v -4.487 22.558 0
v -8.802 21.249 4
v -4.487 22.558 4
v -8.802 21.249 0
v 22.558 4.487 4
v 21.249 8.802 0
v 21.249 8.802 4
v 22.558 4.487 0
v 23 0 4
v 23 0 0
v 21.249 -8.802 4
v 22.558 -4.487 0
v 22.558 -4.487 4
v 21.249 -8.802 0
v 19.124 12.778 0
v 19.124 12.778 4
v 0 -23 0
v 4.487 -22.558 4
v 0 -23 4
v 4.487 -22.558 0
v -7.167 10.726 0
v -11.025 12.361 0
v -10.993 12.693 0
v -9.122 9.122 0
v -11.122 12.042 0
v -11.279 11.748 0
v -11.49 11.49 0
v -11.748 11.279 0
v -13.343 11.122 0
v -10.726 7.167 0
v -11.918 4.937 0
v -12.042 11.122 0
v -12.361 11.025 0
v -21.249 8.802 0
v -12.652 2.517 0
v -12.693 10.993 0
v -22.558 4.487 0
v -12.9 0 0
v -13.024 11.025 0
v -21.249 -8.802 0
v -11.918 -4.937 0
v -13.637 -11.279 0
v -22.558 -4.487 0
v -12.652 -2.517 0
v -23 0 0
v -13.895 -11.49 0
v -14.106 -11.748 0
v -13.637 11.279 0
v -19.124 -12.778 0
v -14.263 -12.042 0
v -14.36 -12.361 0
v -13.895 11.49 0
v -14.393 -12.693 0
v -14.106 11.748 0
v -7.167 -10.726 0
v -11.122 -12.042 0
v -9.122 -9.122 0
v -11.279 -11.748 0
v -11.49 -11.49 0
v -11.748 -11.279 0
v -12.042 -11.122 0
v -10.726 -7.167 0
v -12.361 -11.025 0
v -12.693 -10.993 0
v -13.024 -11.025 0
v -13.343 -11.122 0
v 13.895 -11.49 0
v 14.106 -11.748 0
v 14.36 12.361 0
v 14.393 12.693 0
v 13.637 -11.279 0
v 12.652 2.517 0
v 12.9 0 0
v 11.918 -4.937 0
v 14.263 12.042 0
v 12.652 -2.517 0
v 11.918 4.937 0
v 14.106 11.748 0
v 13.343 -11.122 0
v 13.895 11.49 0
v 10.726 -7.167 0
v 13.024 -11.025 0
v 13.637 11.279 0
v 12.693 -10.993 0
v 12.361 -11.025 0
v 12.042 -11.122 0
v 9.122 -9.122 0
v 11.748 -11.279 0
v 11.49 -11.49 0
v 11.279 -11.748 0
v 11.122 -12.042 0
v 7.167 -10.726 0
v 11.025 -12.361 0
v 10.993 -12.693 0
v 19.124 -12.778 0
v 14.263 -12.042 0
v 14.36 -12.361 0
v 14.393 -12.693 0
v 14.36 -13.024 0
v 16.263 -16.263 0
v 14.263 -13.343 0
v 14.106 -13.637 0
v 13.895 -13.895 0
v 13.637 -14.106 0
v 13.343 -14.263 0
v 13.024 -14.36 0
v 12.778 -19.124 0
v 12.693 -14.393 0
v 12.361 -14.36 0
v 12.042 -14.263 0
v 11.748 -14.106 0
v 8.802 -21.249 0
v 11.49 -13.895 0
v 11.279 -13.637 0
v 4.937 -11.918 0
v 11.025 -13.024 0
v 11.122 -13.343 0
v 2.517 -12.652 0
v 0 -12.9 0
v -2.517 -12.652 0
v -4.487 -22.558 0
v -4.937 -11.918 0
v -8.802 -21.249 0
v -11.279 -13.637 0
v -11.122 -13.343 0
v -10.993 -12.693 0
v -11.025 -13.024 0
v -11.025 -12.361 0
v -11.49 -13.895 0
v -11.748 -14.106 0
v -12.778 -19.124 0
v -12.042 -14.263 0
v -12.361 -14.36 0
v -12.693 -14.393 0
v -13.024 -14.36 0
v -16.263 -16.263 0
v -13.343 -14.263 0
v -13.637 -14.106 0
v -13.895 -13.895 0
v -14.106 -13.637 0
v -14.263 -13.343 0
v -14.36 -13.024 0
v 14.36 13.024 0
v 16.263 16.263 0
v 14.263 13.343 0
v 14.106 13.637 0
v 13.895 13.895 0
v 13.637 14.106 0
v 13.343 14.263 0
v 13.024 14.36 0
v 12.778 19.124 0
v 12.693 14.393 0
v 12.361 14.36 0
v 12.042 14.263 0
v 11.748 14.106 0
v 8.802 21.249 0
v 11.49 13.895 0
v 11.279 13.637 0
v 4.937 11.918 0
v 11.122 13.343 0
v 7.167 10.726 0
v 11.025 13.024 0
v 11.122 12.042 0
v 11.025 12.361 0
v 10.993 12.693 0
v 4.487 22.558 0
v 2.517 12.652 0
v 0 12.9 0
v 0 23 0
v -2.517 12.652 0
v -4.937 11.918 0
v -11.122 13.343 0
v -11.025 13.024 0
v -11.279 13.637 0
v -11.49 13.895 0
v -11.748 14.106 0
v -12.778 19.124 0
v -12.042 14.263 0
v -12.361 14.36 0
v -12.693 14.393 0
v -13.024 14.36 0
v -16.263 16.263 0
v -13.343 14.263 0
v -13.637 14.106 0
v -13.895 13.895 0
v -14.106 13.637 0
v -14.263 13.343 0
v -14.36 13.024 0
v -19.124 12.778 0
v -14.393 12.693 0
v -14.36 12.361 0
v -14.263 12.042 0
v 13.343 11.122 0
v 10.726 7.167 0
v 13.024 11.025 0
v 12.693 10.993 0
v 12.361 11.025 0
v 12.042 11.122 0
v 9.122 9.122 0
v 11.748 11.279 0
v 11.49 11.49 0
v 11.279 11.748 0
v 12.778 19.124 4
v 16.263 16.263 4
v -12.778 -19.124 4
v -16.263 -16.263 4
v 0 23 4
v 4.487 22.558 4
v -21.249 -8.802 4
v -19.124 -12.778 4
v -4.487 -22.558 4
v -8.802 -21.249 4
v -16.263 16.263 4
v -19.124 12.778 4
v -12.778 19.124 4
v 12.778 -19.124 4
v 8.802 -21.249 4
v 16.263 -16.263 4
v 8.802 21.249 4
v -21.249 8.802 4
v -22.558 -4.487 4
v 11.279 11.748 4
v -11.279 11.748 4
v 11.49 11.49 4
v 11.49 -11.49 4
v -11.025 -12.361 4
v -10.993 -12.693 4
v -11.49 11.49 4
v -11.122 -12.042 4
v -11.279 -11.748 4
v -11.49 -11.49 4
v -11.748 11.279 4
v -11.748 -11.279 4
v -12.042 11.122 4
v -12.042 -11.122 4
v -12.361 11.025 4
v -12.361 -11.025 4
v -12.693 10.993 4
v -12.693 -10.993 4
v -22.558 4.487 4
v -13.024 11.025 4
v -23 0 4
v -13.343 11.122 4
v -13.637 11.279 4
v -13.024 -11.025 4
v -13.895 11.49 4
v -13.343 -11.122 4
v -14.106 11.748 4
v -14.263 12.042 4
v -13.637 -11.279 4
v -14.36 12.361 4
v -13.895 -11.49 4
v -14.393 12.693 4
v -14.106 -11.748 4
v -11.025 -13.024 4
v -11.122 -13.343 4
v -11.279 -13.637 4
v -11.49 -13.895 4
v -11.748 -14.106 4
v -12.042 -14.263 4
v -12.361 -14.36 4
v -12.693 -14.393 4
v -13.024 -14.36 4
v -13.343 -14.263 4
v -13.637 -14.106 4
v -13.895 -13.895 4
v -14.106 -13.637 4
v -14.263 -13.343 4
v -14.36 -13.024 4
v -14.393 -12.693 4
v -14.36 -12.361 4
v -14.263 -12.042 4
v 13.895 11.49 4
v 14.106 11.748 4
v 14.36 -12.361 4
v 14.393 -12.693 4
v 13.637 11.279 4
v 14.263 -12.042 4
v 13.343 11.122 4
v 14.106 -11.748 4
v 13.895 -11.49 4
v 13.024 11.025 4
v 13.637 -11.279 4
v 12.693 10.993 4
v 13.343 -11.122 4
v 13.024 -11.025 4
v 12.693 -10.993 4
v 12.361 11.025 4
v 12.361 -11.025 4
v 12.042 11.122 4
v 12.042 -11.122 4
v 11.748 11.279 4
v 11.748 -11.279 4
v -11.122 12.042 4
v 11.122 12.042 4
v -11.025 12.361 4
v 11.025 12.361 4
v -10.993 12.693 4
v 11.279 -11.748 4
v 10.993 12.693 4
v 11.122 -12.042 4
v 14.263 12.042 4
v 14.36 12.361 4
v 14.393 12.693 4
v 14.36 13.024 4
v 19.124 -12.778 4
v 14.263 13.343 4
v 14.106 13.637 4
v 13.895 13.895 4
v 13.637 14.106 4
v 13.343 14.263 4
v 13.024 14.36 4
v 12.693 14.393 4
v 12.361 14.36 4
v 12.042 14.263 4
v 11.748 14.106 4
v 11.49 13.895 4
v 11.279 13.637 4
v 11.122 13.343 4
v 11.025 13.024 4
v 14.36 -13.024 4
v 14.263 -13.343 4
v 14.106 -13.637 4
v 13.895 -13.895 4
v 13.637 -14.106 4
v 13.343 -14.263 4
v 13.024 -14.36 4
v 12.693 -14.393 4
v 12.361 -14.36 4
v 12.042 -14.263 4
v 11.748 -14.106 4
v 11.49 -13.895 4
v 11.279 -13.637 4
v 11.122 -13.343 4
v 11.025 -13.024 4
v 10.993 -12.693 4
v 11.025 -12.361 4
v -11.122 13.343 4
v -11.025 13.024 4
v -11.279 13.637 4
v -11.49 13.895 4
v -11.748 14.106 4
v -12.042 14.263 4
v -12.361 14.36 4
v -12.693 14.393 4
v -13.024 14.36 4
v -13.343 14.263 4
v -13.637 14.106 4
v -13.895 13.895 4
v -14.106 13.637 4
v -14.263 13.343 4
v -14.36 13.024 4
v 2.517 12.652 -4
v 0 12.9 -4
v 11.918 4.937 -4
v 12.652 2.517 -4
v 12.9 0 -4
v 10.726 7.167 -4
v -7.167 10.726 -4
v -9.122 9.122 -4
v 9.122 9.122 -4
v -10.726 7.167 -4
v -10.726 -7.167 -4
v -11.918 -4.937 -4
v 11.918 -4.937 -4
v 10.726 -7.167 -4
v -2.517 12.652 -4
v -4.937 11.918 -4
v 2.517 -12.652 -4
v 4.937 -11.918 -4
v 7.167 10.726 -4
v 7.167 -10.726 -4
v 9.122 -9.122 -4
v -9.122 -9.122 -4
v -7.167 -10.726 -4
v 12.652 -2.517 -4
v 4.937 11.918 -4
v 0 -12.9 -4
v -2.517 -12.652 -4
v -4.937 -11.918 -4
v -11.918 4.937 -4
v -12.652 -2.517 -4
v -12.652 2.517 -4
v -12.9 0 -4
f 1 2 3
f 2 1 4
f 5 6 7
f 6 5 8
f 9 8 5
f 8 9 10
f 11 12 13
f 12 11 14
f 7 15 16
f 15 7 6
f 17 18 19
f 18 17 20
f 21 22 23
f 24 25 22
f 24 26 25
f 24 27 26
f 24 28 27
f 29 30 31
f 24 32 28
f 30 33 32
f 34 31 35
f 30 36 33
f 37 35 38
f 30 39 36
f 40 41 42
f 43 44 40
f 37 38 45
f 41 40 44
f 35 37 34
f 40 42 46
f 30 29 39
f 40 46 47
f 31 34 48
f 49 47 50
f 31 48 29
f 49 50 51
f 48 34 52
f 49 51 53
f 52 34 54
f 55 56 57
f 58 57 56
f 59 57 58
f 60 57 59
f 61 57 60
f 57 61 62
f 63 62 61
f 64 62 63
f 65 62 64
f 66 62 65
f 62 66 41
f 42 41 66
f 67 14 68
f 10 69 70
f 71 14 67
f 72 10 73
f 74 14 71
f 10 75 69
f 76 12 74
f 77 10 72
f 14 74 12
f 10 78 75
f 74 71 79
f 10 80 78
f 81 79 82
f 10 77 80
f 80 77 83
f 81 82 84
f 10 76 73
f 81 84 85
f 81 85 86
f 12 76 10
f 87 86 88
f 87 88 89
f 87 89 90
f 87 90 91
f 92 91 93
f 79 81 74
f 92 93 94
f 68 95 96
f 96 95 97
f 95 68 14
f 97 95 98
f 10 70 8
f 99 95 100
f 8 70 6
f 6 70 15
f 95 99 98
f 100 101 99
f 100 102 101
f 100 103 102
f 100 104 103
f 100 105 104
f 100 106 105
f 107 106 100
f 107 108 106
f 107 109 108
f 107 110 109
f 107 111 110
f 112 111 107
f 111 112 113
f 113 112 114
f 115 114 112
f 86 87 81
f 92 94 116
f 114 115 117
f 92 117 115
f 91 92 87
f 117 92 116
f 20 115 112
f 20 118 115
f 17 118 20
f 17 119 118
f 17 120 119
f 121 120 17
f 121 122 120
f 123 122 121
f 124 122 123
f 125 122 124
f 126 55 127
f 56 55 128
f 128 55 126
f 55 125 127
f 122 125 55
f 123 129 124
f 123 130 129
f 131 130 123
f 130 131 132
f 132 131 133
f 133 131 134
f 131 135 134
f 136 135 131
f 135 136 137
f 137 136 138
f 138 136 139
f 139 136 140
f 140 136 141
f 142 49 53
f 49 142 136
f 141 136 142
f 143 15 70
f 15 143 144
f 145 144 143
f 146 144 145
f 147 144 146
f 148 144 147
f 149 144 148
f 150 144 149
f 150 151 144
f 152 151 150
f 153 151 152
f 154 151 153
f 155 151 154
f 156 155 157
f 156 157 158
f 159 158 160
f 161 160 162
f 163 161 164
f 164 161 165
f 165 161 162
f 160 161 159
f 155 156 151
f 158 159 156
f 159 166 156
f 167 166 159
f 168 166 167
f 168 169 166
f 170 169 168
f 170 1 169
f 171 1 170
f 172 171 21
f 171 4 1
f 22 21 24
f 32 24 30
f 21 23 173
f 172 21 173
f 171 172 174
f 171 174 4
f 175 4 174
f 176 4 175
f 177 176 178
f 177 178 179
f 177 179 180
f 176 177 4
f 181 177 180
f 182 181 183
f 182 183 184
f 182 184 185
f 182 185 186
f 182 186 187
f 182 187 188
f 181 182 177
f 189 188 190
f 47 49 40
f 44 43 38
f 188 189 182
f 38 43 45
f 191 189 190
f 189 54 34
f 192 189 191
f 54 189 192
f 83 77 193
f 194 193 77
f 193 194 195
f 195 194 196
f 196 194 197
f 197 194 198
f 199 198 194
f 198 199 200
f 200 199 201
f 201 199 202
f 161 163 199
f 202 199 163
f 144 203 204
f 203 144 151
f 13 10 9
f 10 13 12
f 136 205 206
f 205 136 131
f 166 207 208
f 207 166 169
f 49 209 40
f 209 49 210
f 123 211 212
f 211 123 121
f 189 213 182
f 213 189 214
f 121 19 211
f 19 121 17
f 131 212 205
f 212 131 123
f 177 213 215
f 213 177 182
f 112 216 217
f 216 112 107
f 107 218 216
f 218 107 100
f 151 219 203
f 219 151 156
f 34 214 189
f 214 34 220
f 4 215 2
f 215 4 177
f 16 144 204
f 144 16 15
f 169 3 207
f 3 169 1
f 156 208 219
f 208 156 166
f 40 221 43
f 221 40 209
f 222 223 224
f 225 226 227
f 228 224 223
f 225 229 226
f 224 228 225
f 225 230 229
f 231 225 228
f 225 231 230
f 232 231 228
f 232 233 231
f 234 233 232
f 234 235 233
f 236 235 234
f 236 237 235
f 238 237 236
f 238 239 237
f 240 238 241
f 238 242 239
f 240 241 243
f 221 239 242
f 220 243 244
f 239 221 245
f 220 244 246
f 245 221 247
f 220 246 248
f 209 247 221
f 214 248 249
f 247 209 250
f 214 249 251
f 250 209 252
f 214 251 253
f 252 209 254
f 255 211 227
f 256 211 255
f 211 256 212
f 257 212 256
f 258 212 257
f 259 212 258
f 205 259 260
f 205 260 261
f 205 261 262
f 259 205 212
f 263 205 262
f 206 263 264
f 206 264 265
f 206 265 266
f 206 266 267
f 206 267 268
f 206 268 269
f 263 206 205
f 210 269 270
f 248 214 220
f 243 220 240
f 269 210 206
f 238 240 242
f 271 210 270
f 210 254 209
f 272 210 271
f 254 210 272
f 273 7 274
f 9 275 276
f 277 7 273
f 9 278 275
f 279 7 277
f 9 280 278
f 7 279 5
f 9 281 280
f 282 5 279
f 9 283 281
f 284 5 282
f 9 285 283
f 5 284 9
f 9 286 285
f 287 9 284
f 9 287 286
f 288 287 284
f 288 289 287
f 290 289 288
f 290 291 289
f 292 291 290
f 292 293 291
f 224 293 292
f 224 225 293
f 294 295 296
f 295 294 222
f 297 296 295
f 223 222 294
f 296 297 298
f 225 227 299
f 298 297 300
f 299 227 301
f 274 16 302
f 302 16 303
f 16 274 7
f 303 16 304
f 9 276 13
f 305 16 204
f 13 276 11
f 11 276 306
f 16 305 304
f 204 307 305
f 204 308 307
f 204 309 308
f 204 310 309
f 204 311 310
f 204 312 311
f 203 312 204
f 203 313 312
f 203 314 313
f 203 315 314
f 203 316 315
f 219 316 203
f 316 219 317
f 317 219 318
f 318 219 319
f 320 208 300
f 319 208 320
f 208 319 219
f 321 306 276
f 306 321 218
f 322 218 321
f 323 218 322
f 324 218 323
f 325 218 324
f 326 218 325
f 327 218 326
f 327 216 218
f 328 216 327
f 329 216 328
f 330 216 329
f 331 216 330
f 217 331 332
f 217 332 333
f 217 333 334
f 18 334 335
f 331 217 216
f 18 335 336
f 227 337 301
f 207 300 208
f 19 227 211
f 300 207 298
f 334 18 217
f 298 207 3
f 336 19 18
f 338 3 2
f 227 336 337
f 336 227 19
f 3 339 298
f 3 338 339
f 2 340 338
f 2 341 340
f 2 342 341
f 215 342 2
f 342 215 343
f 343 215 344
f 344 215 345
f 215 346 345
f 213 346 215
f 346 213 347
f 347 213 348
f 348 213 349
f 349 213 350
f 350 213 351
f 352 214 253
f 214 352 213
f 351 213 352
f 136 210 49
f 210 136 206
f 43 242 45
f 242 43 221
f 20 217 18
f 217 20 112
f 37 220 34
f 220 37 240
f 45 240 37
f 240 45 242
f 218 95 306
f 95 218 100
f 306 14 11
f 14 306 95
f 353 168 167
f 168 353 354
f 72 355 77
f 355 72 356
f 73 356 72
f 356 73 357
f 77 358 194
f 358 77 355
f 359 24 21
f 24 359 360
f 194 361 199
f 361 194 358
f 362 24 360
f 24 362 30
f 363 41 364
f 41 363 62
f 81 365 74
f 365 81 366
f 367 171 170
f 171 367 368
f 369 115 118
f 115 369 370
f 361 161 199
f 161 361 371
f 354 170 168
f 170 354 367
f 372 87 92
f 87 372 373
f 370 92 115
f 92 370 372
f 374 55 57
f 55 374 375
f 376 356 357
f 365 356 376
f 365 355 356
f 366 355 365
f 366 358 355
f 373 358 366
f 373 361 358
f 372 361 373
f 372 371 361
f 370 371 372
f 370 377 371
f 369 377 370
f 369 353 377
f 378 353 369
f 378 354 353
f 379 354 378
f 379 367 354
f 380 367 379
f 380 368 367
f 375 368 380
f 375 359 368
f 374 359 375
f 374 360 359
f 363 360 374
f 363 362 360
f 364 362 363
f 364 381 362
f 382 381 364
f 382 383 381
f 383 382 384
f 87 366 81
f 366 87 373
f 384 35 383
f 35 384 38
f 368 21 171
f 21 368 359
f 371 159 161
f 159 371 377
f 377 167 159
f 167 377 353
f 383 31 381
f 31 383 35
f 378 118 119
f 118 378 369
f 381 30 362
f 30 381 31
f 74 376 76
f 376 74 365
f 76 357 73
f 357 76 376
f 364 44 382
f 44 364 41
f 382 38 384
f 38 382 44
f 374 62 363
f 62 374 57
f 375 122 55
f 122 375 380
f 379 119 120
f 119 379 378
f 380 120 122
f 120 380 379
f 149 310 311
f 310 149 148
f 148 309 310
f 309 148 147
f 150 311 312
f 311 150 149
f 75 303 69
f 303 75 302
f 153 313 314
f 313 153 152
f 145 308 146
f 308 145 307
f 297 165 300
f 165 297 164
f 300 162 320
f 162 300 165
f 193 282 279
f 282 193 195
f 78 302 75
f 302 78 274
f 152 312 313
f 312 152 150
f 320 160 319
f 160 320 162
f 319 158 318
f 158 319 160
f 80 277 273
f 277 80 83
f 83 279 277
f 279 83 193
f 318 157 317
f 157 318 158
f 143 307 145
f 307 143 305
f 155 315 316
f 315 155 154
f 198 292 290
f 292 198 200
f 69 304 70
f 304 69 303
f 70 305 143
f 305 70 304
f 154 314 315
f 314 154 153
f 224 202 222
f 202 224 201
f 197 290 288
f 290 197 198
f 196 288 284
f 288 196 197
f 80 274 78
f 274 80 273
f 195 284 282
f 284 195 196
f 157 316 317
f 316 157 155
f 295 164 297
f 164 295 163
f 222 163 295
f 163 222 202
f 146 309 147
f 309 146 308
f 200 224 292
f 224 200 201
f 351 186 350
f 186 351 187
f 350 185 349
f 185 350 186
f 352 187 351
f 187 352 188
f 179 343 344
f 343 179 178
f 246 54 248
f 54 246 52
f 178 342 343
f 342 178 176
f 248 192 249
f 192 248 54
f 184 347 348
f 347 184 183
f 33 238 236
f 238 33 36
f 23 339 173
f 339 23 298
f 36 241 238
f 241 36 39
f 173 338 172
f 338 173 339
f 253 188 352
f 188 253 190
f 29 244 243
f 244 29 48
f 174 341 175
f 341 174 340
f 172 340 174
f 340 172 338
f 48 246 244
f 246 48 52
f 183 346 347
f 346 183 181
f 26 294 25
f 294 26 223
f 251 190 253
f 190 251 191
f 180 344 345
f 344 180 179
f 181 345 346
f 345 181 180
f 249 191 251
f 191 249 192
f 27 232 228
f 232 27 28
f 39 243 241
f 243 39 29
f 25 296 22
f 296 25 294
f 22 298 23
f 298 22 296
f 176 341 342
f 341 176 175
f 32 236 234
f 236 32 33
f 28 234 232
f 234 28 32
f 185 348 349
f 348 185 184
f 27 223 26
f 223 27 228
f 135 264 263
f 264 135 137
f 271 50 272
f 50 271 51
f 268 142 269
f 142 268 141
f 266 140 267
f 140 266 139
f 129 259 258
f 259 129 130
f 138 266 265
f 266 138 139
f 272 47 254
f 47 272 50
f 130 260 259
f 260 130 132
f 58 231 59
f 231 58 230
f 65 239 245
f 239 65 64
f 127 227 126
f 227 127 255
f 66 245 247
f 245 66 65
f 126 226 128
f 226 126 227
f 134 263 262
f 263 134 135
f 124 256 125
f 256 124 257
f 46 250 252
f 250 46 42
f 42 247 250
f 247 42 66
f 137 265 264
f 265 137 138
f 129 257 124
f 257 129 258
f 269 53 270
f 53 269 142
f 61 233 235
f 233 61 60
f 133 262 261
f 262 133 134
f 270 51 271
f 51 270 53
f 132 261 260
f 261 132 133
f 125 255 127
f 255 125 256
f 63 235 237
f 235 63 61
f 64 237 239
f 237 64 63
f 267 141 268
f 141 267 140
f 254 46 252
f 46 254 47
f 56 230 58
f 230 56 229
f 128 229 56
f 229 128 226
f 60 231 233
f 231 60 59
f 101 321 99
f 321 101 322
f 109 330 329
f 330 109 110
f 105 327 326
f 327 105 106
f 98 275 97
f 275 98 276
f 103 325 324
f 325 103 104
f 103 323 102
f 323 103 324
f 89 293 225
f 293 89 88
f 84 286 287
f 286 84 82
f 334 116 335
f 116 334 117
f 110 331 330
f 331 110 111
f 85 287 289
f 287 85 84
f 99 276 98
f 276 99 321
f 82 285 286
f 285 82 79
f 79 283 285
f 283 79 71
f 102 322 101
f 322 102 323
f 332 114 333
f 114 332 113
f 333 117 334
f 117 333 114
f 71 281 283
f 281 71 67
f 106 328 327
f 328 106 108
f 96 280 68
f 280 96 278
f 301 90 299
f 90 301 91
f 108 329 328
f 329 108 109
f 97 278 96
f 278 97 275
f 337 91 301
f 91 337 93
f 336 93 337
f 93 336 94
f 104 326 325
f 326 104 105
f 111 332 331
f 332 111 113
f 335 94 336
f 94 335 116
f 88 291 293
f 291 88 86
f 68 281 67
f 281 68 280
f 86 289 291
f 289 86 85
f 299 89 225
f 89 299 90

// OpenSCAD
$fn = 32;

// ----------------------------------------------------------------------
// Retaining cap: 6000 cover, 46 mm, spigot 25.8 mm
// ----------------------------------------------------------------------

// --- parameters (mm) ---
plate_d = 46;             // cover diameter
plate_t = 4;              // cover thickness
boss_d = 25.8;            // spigot that enters the housing
boss_h = 4;               // spigot height
bolt_d = 3.4;             // bolt clearance
bolt_r = 17.95;           // bolt circle radius

module cover() {
  cylinder(h = plate_t, d = plate_d);
}

module spigot() {
  /* sunk 1 mm into the cover; the spigot sets the overall height */
  translate([0, 0, -boss_h]) cylinder(h = boss_h + 1, d = boss_d);
}

difference() {
  union() {
    cover();
    spigot();
  }
  for (i = [0 : 3]) rotate([0, 0, 45 + i * 90]) translate([bolt_r, 0, -boss_h - 1])
    cylinder(h = boss_h + plate_t + 2, d = bolt_d);
}
